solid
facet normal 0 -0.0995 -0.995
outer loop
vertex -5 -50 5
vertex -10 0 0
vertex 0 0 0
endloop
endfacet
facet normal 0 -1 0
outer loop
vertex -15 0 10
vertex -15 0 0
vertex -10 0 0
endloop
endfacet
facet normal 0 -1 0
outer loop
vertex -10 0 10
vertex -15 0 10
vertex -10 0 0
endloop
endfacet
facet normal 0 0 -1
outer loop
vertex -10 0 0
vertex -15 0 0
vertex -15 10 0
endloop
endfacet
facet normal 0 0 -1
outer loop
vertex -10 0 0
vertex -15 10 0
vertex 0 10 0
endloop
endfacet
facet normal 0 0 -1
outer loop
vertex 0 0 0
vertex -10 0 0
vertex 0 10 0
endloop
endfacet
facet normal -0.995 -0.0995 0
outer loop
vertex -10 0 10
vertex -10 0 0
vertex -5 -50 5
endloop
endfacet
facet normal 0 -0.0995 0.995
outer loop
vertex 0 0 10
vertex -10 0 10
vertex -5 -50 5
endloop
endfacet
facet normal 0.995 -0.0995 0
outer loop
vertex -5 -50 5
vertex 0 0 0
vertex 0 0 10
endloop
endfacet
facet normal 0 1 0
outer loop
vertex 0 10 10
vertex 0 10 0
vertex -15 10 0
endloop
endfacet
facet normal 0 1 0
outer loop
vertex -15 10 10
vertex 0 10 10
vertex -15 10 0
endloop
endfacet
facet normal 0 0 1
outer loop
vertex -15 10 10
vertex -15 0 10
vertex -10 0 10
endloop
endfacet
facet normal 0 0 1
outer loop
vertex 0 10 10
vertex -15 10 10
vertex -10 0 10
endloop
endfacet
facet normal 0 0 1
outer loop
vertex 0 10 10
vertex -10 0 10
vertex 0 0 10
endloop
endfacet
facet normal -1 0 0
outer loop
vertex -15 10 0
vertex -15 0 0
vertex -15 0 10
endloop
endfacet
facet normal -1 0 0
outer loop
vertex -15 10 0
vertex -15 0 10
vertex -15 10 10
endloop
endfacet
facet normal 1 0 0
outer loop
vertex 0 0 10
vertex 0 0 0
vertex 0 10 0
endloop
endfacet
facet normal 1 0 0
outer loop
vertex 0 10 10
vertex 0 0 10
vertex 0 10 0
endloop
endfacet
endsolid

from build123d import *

# Parameters (mm, degrees)
F0_W     = 10
F0_H     = 50
F0_H_2   = 10
F0_W_2   = 5
F1_DEPTH = 10
F2_SIZE2 = 49.99999
F2_SIZE  = 4.99999


# Not quite as in the source:
# - a fillet or chamfer is up to 0.001 mm smaller than in the source, because OpenCascade refuses the exact size


with BuildPart() as f1:
    # F0 (on Top) → F1 (new body)
    with BuildSketch(Plane.XY):
        with Locations((-5, -25)):
            Rectangle(F0_W, F0_H)
        with Locations((-5, 5)):
            Rectangle(F0_W, F0_H_2)
        with Locations((-12.5, 5)):
            Rectangle(F0_W_2, F0_H_2)
    extrude(amount=F1_DEPTH)

    # F2 (size 5 and 50 in the source; OpenCascade refuses exactly that, so slightly less here)
    f2_edges = [f1.edges().sort_by_distance(p)[0] for p in [
        (-5, -50, 10),
        (-10, -50, 5),
        (-5, -50, 0),
        (0, -50, 5),
    ]]
    f2_side = f1.faces().sort_by_distance((-5, -50, 5))[0]
    chamfer(f2_edges, length=F2_SIZE, length2=F2_SIZE2, reference=f2_side)


solid = f1.part
